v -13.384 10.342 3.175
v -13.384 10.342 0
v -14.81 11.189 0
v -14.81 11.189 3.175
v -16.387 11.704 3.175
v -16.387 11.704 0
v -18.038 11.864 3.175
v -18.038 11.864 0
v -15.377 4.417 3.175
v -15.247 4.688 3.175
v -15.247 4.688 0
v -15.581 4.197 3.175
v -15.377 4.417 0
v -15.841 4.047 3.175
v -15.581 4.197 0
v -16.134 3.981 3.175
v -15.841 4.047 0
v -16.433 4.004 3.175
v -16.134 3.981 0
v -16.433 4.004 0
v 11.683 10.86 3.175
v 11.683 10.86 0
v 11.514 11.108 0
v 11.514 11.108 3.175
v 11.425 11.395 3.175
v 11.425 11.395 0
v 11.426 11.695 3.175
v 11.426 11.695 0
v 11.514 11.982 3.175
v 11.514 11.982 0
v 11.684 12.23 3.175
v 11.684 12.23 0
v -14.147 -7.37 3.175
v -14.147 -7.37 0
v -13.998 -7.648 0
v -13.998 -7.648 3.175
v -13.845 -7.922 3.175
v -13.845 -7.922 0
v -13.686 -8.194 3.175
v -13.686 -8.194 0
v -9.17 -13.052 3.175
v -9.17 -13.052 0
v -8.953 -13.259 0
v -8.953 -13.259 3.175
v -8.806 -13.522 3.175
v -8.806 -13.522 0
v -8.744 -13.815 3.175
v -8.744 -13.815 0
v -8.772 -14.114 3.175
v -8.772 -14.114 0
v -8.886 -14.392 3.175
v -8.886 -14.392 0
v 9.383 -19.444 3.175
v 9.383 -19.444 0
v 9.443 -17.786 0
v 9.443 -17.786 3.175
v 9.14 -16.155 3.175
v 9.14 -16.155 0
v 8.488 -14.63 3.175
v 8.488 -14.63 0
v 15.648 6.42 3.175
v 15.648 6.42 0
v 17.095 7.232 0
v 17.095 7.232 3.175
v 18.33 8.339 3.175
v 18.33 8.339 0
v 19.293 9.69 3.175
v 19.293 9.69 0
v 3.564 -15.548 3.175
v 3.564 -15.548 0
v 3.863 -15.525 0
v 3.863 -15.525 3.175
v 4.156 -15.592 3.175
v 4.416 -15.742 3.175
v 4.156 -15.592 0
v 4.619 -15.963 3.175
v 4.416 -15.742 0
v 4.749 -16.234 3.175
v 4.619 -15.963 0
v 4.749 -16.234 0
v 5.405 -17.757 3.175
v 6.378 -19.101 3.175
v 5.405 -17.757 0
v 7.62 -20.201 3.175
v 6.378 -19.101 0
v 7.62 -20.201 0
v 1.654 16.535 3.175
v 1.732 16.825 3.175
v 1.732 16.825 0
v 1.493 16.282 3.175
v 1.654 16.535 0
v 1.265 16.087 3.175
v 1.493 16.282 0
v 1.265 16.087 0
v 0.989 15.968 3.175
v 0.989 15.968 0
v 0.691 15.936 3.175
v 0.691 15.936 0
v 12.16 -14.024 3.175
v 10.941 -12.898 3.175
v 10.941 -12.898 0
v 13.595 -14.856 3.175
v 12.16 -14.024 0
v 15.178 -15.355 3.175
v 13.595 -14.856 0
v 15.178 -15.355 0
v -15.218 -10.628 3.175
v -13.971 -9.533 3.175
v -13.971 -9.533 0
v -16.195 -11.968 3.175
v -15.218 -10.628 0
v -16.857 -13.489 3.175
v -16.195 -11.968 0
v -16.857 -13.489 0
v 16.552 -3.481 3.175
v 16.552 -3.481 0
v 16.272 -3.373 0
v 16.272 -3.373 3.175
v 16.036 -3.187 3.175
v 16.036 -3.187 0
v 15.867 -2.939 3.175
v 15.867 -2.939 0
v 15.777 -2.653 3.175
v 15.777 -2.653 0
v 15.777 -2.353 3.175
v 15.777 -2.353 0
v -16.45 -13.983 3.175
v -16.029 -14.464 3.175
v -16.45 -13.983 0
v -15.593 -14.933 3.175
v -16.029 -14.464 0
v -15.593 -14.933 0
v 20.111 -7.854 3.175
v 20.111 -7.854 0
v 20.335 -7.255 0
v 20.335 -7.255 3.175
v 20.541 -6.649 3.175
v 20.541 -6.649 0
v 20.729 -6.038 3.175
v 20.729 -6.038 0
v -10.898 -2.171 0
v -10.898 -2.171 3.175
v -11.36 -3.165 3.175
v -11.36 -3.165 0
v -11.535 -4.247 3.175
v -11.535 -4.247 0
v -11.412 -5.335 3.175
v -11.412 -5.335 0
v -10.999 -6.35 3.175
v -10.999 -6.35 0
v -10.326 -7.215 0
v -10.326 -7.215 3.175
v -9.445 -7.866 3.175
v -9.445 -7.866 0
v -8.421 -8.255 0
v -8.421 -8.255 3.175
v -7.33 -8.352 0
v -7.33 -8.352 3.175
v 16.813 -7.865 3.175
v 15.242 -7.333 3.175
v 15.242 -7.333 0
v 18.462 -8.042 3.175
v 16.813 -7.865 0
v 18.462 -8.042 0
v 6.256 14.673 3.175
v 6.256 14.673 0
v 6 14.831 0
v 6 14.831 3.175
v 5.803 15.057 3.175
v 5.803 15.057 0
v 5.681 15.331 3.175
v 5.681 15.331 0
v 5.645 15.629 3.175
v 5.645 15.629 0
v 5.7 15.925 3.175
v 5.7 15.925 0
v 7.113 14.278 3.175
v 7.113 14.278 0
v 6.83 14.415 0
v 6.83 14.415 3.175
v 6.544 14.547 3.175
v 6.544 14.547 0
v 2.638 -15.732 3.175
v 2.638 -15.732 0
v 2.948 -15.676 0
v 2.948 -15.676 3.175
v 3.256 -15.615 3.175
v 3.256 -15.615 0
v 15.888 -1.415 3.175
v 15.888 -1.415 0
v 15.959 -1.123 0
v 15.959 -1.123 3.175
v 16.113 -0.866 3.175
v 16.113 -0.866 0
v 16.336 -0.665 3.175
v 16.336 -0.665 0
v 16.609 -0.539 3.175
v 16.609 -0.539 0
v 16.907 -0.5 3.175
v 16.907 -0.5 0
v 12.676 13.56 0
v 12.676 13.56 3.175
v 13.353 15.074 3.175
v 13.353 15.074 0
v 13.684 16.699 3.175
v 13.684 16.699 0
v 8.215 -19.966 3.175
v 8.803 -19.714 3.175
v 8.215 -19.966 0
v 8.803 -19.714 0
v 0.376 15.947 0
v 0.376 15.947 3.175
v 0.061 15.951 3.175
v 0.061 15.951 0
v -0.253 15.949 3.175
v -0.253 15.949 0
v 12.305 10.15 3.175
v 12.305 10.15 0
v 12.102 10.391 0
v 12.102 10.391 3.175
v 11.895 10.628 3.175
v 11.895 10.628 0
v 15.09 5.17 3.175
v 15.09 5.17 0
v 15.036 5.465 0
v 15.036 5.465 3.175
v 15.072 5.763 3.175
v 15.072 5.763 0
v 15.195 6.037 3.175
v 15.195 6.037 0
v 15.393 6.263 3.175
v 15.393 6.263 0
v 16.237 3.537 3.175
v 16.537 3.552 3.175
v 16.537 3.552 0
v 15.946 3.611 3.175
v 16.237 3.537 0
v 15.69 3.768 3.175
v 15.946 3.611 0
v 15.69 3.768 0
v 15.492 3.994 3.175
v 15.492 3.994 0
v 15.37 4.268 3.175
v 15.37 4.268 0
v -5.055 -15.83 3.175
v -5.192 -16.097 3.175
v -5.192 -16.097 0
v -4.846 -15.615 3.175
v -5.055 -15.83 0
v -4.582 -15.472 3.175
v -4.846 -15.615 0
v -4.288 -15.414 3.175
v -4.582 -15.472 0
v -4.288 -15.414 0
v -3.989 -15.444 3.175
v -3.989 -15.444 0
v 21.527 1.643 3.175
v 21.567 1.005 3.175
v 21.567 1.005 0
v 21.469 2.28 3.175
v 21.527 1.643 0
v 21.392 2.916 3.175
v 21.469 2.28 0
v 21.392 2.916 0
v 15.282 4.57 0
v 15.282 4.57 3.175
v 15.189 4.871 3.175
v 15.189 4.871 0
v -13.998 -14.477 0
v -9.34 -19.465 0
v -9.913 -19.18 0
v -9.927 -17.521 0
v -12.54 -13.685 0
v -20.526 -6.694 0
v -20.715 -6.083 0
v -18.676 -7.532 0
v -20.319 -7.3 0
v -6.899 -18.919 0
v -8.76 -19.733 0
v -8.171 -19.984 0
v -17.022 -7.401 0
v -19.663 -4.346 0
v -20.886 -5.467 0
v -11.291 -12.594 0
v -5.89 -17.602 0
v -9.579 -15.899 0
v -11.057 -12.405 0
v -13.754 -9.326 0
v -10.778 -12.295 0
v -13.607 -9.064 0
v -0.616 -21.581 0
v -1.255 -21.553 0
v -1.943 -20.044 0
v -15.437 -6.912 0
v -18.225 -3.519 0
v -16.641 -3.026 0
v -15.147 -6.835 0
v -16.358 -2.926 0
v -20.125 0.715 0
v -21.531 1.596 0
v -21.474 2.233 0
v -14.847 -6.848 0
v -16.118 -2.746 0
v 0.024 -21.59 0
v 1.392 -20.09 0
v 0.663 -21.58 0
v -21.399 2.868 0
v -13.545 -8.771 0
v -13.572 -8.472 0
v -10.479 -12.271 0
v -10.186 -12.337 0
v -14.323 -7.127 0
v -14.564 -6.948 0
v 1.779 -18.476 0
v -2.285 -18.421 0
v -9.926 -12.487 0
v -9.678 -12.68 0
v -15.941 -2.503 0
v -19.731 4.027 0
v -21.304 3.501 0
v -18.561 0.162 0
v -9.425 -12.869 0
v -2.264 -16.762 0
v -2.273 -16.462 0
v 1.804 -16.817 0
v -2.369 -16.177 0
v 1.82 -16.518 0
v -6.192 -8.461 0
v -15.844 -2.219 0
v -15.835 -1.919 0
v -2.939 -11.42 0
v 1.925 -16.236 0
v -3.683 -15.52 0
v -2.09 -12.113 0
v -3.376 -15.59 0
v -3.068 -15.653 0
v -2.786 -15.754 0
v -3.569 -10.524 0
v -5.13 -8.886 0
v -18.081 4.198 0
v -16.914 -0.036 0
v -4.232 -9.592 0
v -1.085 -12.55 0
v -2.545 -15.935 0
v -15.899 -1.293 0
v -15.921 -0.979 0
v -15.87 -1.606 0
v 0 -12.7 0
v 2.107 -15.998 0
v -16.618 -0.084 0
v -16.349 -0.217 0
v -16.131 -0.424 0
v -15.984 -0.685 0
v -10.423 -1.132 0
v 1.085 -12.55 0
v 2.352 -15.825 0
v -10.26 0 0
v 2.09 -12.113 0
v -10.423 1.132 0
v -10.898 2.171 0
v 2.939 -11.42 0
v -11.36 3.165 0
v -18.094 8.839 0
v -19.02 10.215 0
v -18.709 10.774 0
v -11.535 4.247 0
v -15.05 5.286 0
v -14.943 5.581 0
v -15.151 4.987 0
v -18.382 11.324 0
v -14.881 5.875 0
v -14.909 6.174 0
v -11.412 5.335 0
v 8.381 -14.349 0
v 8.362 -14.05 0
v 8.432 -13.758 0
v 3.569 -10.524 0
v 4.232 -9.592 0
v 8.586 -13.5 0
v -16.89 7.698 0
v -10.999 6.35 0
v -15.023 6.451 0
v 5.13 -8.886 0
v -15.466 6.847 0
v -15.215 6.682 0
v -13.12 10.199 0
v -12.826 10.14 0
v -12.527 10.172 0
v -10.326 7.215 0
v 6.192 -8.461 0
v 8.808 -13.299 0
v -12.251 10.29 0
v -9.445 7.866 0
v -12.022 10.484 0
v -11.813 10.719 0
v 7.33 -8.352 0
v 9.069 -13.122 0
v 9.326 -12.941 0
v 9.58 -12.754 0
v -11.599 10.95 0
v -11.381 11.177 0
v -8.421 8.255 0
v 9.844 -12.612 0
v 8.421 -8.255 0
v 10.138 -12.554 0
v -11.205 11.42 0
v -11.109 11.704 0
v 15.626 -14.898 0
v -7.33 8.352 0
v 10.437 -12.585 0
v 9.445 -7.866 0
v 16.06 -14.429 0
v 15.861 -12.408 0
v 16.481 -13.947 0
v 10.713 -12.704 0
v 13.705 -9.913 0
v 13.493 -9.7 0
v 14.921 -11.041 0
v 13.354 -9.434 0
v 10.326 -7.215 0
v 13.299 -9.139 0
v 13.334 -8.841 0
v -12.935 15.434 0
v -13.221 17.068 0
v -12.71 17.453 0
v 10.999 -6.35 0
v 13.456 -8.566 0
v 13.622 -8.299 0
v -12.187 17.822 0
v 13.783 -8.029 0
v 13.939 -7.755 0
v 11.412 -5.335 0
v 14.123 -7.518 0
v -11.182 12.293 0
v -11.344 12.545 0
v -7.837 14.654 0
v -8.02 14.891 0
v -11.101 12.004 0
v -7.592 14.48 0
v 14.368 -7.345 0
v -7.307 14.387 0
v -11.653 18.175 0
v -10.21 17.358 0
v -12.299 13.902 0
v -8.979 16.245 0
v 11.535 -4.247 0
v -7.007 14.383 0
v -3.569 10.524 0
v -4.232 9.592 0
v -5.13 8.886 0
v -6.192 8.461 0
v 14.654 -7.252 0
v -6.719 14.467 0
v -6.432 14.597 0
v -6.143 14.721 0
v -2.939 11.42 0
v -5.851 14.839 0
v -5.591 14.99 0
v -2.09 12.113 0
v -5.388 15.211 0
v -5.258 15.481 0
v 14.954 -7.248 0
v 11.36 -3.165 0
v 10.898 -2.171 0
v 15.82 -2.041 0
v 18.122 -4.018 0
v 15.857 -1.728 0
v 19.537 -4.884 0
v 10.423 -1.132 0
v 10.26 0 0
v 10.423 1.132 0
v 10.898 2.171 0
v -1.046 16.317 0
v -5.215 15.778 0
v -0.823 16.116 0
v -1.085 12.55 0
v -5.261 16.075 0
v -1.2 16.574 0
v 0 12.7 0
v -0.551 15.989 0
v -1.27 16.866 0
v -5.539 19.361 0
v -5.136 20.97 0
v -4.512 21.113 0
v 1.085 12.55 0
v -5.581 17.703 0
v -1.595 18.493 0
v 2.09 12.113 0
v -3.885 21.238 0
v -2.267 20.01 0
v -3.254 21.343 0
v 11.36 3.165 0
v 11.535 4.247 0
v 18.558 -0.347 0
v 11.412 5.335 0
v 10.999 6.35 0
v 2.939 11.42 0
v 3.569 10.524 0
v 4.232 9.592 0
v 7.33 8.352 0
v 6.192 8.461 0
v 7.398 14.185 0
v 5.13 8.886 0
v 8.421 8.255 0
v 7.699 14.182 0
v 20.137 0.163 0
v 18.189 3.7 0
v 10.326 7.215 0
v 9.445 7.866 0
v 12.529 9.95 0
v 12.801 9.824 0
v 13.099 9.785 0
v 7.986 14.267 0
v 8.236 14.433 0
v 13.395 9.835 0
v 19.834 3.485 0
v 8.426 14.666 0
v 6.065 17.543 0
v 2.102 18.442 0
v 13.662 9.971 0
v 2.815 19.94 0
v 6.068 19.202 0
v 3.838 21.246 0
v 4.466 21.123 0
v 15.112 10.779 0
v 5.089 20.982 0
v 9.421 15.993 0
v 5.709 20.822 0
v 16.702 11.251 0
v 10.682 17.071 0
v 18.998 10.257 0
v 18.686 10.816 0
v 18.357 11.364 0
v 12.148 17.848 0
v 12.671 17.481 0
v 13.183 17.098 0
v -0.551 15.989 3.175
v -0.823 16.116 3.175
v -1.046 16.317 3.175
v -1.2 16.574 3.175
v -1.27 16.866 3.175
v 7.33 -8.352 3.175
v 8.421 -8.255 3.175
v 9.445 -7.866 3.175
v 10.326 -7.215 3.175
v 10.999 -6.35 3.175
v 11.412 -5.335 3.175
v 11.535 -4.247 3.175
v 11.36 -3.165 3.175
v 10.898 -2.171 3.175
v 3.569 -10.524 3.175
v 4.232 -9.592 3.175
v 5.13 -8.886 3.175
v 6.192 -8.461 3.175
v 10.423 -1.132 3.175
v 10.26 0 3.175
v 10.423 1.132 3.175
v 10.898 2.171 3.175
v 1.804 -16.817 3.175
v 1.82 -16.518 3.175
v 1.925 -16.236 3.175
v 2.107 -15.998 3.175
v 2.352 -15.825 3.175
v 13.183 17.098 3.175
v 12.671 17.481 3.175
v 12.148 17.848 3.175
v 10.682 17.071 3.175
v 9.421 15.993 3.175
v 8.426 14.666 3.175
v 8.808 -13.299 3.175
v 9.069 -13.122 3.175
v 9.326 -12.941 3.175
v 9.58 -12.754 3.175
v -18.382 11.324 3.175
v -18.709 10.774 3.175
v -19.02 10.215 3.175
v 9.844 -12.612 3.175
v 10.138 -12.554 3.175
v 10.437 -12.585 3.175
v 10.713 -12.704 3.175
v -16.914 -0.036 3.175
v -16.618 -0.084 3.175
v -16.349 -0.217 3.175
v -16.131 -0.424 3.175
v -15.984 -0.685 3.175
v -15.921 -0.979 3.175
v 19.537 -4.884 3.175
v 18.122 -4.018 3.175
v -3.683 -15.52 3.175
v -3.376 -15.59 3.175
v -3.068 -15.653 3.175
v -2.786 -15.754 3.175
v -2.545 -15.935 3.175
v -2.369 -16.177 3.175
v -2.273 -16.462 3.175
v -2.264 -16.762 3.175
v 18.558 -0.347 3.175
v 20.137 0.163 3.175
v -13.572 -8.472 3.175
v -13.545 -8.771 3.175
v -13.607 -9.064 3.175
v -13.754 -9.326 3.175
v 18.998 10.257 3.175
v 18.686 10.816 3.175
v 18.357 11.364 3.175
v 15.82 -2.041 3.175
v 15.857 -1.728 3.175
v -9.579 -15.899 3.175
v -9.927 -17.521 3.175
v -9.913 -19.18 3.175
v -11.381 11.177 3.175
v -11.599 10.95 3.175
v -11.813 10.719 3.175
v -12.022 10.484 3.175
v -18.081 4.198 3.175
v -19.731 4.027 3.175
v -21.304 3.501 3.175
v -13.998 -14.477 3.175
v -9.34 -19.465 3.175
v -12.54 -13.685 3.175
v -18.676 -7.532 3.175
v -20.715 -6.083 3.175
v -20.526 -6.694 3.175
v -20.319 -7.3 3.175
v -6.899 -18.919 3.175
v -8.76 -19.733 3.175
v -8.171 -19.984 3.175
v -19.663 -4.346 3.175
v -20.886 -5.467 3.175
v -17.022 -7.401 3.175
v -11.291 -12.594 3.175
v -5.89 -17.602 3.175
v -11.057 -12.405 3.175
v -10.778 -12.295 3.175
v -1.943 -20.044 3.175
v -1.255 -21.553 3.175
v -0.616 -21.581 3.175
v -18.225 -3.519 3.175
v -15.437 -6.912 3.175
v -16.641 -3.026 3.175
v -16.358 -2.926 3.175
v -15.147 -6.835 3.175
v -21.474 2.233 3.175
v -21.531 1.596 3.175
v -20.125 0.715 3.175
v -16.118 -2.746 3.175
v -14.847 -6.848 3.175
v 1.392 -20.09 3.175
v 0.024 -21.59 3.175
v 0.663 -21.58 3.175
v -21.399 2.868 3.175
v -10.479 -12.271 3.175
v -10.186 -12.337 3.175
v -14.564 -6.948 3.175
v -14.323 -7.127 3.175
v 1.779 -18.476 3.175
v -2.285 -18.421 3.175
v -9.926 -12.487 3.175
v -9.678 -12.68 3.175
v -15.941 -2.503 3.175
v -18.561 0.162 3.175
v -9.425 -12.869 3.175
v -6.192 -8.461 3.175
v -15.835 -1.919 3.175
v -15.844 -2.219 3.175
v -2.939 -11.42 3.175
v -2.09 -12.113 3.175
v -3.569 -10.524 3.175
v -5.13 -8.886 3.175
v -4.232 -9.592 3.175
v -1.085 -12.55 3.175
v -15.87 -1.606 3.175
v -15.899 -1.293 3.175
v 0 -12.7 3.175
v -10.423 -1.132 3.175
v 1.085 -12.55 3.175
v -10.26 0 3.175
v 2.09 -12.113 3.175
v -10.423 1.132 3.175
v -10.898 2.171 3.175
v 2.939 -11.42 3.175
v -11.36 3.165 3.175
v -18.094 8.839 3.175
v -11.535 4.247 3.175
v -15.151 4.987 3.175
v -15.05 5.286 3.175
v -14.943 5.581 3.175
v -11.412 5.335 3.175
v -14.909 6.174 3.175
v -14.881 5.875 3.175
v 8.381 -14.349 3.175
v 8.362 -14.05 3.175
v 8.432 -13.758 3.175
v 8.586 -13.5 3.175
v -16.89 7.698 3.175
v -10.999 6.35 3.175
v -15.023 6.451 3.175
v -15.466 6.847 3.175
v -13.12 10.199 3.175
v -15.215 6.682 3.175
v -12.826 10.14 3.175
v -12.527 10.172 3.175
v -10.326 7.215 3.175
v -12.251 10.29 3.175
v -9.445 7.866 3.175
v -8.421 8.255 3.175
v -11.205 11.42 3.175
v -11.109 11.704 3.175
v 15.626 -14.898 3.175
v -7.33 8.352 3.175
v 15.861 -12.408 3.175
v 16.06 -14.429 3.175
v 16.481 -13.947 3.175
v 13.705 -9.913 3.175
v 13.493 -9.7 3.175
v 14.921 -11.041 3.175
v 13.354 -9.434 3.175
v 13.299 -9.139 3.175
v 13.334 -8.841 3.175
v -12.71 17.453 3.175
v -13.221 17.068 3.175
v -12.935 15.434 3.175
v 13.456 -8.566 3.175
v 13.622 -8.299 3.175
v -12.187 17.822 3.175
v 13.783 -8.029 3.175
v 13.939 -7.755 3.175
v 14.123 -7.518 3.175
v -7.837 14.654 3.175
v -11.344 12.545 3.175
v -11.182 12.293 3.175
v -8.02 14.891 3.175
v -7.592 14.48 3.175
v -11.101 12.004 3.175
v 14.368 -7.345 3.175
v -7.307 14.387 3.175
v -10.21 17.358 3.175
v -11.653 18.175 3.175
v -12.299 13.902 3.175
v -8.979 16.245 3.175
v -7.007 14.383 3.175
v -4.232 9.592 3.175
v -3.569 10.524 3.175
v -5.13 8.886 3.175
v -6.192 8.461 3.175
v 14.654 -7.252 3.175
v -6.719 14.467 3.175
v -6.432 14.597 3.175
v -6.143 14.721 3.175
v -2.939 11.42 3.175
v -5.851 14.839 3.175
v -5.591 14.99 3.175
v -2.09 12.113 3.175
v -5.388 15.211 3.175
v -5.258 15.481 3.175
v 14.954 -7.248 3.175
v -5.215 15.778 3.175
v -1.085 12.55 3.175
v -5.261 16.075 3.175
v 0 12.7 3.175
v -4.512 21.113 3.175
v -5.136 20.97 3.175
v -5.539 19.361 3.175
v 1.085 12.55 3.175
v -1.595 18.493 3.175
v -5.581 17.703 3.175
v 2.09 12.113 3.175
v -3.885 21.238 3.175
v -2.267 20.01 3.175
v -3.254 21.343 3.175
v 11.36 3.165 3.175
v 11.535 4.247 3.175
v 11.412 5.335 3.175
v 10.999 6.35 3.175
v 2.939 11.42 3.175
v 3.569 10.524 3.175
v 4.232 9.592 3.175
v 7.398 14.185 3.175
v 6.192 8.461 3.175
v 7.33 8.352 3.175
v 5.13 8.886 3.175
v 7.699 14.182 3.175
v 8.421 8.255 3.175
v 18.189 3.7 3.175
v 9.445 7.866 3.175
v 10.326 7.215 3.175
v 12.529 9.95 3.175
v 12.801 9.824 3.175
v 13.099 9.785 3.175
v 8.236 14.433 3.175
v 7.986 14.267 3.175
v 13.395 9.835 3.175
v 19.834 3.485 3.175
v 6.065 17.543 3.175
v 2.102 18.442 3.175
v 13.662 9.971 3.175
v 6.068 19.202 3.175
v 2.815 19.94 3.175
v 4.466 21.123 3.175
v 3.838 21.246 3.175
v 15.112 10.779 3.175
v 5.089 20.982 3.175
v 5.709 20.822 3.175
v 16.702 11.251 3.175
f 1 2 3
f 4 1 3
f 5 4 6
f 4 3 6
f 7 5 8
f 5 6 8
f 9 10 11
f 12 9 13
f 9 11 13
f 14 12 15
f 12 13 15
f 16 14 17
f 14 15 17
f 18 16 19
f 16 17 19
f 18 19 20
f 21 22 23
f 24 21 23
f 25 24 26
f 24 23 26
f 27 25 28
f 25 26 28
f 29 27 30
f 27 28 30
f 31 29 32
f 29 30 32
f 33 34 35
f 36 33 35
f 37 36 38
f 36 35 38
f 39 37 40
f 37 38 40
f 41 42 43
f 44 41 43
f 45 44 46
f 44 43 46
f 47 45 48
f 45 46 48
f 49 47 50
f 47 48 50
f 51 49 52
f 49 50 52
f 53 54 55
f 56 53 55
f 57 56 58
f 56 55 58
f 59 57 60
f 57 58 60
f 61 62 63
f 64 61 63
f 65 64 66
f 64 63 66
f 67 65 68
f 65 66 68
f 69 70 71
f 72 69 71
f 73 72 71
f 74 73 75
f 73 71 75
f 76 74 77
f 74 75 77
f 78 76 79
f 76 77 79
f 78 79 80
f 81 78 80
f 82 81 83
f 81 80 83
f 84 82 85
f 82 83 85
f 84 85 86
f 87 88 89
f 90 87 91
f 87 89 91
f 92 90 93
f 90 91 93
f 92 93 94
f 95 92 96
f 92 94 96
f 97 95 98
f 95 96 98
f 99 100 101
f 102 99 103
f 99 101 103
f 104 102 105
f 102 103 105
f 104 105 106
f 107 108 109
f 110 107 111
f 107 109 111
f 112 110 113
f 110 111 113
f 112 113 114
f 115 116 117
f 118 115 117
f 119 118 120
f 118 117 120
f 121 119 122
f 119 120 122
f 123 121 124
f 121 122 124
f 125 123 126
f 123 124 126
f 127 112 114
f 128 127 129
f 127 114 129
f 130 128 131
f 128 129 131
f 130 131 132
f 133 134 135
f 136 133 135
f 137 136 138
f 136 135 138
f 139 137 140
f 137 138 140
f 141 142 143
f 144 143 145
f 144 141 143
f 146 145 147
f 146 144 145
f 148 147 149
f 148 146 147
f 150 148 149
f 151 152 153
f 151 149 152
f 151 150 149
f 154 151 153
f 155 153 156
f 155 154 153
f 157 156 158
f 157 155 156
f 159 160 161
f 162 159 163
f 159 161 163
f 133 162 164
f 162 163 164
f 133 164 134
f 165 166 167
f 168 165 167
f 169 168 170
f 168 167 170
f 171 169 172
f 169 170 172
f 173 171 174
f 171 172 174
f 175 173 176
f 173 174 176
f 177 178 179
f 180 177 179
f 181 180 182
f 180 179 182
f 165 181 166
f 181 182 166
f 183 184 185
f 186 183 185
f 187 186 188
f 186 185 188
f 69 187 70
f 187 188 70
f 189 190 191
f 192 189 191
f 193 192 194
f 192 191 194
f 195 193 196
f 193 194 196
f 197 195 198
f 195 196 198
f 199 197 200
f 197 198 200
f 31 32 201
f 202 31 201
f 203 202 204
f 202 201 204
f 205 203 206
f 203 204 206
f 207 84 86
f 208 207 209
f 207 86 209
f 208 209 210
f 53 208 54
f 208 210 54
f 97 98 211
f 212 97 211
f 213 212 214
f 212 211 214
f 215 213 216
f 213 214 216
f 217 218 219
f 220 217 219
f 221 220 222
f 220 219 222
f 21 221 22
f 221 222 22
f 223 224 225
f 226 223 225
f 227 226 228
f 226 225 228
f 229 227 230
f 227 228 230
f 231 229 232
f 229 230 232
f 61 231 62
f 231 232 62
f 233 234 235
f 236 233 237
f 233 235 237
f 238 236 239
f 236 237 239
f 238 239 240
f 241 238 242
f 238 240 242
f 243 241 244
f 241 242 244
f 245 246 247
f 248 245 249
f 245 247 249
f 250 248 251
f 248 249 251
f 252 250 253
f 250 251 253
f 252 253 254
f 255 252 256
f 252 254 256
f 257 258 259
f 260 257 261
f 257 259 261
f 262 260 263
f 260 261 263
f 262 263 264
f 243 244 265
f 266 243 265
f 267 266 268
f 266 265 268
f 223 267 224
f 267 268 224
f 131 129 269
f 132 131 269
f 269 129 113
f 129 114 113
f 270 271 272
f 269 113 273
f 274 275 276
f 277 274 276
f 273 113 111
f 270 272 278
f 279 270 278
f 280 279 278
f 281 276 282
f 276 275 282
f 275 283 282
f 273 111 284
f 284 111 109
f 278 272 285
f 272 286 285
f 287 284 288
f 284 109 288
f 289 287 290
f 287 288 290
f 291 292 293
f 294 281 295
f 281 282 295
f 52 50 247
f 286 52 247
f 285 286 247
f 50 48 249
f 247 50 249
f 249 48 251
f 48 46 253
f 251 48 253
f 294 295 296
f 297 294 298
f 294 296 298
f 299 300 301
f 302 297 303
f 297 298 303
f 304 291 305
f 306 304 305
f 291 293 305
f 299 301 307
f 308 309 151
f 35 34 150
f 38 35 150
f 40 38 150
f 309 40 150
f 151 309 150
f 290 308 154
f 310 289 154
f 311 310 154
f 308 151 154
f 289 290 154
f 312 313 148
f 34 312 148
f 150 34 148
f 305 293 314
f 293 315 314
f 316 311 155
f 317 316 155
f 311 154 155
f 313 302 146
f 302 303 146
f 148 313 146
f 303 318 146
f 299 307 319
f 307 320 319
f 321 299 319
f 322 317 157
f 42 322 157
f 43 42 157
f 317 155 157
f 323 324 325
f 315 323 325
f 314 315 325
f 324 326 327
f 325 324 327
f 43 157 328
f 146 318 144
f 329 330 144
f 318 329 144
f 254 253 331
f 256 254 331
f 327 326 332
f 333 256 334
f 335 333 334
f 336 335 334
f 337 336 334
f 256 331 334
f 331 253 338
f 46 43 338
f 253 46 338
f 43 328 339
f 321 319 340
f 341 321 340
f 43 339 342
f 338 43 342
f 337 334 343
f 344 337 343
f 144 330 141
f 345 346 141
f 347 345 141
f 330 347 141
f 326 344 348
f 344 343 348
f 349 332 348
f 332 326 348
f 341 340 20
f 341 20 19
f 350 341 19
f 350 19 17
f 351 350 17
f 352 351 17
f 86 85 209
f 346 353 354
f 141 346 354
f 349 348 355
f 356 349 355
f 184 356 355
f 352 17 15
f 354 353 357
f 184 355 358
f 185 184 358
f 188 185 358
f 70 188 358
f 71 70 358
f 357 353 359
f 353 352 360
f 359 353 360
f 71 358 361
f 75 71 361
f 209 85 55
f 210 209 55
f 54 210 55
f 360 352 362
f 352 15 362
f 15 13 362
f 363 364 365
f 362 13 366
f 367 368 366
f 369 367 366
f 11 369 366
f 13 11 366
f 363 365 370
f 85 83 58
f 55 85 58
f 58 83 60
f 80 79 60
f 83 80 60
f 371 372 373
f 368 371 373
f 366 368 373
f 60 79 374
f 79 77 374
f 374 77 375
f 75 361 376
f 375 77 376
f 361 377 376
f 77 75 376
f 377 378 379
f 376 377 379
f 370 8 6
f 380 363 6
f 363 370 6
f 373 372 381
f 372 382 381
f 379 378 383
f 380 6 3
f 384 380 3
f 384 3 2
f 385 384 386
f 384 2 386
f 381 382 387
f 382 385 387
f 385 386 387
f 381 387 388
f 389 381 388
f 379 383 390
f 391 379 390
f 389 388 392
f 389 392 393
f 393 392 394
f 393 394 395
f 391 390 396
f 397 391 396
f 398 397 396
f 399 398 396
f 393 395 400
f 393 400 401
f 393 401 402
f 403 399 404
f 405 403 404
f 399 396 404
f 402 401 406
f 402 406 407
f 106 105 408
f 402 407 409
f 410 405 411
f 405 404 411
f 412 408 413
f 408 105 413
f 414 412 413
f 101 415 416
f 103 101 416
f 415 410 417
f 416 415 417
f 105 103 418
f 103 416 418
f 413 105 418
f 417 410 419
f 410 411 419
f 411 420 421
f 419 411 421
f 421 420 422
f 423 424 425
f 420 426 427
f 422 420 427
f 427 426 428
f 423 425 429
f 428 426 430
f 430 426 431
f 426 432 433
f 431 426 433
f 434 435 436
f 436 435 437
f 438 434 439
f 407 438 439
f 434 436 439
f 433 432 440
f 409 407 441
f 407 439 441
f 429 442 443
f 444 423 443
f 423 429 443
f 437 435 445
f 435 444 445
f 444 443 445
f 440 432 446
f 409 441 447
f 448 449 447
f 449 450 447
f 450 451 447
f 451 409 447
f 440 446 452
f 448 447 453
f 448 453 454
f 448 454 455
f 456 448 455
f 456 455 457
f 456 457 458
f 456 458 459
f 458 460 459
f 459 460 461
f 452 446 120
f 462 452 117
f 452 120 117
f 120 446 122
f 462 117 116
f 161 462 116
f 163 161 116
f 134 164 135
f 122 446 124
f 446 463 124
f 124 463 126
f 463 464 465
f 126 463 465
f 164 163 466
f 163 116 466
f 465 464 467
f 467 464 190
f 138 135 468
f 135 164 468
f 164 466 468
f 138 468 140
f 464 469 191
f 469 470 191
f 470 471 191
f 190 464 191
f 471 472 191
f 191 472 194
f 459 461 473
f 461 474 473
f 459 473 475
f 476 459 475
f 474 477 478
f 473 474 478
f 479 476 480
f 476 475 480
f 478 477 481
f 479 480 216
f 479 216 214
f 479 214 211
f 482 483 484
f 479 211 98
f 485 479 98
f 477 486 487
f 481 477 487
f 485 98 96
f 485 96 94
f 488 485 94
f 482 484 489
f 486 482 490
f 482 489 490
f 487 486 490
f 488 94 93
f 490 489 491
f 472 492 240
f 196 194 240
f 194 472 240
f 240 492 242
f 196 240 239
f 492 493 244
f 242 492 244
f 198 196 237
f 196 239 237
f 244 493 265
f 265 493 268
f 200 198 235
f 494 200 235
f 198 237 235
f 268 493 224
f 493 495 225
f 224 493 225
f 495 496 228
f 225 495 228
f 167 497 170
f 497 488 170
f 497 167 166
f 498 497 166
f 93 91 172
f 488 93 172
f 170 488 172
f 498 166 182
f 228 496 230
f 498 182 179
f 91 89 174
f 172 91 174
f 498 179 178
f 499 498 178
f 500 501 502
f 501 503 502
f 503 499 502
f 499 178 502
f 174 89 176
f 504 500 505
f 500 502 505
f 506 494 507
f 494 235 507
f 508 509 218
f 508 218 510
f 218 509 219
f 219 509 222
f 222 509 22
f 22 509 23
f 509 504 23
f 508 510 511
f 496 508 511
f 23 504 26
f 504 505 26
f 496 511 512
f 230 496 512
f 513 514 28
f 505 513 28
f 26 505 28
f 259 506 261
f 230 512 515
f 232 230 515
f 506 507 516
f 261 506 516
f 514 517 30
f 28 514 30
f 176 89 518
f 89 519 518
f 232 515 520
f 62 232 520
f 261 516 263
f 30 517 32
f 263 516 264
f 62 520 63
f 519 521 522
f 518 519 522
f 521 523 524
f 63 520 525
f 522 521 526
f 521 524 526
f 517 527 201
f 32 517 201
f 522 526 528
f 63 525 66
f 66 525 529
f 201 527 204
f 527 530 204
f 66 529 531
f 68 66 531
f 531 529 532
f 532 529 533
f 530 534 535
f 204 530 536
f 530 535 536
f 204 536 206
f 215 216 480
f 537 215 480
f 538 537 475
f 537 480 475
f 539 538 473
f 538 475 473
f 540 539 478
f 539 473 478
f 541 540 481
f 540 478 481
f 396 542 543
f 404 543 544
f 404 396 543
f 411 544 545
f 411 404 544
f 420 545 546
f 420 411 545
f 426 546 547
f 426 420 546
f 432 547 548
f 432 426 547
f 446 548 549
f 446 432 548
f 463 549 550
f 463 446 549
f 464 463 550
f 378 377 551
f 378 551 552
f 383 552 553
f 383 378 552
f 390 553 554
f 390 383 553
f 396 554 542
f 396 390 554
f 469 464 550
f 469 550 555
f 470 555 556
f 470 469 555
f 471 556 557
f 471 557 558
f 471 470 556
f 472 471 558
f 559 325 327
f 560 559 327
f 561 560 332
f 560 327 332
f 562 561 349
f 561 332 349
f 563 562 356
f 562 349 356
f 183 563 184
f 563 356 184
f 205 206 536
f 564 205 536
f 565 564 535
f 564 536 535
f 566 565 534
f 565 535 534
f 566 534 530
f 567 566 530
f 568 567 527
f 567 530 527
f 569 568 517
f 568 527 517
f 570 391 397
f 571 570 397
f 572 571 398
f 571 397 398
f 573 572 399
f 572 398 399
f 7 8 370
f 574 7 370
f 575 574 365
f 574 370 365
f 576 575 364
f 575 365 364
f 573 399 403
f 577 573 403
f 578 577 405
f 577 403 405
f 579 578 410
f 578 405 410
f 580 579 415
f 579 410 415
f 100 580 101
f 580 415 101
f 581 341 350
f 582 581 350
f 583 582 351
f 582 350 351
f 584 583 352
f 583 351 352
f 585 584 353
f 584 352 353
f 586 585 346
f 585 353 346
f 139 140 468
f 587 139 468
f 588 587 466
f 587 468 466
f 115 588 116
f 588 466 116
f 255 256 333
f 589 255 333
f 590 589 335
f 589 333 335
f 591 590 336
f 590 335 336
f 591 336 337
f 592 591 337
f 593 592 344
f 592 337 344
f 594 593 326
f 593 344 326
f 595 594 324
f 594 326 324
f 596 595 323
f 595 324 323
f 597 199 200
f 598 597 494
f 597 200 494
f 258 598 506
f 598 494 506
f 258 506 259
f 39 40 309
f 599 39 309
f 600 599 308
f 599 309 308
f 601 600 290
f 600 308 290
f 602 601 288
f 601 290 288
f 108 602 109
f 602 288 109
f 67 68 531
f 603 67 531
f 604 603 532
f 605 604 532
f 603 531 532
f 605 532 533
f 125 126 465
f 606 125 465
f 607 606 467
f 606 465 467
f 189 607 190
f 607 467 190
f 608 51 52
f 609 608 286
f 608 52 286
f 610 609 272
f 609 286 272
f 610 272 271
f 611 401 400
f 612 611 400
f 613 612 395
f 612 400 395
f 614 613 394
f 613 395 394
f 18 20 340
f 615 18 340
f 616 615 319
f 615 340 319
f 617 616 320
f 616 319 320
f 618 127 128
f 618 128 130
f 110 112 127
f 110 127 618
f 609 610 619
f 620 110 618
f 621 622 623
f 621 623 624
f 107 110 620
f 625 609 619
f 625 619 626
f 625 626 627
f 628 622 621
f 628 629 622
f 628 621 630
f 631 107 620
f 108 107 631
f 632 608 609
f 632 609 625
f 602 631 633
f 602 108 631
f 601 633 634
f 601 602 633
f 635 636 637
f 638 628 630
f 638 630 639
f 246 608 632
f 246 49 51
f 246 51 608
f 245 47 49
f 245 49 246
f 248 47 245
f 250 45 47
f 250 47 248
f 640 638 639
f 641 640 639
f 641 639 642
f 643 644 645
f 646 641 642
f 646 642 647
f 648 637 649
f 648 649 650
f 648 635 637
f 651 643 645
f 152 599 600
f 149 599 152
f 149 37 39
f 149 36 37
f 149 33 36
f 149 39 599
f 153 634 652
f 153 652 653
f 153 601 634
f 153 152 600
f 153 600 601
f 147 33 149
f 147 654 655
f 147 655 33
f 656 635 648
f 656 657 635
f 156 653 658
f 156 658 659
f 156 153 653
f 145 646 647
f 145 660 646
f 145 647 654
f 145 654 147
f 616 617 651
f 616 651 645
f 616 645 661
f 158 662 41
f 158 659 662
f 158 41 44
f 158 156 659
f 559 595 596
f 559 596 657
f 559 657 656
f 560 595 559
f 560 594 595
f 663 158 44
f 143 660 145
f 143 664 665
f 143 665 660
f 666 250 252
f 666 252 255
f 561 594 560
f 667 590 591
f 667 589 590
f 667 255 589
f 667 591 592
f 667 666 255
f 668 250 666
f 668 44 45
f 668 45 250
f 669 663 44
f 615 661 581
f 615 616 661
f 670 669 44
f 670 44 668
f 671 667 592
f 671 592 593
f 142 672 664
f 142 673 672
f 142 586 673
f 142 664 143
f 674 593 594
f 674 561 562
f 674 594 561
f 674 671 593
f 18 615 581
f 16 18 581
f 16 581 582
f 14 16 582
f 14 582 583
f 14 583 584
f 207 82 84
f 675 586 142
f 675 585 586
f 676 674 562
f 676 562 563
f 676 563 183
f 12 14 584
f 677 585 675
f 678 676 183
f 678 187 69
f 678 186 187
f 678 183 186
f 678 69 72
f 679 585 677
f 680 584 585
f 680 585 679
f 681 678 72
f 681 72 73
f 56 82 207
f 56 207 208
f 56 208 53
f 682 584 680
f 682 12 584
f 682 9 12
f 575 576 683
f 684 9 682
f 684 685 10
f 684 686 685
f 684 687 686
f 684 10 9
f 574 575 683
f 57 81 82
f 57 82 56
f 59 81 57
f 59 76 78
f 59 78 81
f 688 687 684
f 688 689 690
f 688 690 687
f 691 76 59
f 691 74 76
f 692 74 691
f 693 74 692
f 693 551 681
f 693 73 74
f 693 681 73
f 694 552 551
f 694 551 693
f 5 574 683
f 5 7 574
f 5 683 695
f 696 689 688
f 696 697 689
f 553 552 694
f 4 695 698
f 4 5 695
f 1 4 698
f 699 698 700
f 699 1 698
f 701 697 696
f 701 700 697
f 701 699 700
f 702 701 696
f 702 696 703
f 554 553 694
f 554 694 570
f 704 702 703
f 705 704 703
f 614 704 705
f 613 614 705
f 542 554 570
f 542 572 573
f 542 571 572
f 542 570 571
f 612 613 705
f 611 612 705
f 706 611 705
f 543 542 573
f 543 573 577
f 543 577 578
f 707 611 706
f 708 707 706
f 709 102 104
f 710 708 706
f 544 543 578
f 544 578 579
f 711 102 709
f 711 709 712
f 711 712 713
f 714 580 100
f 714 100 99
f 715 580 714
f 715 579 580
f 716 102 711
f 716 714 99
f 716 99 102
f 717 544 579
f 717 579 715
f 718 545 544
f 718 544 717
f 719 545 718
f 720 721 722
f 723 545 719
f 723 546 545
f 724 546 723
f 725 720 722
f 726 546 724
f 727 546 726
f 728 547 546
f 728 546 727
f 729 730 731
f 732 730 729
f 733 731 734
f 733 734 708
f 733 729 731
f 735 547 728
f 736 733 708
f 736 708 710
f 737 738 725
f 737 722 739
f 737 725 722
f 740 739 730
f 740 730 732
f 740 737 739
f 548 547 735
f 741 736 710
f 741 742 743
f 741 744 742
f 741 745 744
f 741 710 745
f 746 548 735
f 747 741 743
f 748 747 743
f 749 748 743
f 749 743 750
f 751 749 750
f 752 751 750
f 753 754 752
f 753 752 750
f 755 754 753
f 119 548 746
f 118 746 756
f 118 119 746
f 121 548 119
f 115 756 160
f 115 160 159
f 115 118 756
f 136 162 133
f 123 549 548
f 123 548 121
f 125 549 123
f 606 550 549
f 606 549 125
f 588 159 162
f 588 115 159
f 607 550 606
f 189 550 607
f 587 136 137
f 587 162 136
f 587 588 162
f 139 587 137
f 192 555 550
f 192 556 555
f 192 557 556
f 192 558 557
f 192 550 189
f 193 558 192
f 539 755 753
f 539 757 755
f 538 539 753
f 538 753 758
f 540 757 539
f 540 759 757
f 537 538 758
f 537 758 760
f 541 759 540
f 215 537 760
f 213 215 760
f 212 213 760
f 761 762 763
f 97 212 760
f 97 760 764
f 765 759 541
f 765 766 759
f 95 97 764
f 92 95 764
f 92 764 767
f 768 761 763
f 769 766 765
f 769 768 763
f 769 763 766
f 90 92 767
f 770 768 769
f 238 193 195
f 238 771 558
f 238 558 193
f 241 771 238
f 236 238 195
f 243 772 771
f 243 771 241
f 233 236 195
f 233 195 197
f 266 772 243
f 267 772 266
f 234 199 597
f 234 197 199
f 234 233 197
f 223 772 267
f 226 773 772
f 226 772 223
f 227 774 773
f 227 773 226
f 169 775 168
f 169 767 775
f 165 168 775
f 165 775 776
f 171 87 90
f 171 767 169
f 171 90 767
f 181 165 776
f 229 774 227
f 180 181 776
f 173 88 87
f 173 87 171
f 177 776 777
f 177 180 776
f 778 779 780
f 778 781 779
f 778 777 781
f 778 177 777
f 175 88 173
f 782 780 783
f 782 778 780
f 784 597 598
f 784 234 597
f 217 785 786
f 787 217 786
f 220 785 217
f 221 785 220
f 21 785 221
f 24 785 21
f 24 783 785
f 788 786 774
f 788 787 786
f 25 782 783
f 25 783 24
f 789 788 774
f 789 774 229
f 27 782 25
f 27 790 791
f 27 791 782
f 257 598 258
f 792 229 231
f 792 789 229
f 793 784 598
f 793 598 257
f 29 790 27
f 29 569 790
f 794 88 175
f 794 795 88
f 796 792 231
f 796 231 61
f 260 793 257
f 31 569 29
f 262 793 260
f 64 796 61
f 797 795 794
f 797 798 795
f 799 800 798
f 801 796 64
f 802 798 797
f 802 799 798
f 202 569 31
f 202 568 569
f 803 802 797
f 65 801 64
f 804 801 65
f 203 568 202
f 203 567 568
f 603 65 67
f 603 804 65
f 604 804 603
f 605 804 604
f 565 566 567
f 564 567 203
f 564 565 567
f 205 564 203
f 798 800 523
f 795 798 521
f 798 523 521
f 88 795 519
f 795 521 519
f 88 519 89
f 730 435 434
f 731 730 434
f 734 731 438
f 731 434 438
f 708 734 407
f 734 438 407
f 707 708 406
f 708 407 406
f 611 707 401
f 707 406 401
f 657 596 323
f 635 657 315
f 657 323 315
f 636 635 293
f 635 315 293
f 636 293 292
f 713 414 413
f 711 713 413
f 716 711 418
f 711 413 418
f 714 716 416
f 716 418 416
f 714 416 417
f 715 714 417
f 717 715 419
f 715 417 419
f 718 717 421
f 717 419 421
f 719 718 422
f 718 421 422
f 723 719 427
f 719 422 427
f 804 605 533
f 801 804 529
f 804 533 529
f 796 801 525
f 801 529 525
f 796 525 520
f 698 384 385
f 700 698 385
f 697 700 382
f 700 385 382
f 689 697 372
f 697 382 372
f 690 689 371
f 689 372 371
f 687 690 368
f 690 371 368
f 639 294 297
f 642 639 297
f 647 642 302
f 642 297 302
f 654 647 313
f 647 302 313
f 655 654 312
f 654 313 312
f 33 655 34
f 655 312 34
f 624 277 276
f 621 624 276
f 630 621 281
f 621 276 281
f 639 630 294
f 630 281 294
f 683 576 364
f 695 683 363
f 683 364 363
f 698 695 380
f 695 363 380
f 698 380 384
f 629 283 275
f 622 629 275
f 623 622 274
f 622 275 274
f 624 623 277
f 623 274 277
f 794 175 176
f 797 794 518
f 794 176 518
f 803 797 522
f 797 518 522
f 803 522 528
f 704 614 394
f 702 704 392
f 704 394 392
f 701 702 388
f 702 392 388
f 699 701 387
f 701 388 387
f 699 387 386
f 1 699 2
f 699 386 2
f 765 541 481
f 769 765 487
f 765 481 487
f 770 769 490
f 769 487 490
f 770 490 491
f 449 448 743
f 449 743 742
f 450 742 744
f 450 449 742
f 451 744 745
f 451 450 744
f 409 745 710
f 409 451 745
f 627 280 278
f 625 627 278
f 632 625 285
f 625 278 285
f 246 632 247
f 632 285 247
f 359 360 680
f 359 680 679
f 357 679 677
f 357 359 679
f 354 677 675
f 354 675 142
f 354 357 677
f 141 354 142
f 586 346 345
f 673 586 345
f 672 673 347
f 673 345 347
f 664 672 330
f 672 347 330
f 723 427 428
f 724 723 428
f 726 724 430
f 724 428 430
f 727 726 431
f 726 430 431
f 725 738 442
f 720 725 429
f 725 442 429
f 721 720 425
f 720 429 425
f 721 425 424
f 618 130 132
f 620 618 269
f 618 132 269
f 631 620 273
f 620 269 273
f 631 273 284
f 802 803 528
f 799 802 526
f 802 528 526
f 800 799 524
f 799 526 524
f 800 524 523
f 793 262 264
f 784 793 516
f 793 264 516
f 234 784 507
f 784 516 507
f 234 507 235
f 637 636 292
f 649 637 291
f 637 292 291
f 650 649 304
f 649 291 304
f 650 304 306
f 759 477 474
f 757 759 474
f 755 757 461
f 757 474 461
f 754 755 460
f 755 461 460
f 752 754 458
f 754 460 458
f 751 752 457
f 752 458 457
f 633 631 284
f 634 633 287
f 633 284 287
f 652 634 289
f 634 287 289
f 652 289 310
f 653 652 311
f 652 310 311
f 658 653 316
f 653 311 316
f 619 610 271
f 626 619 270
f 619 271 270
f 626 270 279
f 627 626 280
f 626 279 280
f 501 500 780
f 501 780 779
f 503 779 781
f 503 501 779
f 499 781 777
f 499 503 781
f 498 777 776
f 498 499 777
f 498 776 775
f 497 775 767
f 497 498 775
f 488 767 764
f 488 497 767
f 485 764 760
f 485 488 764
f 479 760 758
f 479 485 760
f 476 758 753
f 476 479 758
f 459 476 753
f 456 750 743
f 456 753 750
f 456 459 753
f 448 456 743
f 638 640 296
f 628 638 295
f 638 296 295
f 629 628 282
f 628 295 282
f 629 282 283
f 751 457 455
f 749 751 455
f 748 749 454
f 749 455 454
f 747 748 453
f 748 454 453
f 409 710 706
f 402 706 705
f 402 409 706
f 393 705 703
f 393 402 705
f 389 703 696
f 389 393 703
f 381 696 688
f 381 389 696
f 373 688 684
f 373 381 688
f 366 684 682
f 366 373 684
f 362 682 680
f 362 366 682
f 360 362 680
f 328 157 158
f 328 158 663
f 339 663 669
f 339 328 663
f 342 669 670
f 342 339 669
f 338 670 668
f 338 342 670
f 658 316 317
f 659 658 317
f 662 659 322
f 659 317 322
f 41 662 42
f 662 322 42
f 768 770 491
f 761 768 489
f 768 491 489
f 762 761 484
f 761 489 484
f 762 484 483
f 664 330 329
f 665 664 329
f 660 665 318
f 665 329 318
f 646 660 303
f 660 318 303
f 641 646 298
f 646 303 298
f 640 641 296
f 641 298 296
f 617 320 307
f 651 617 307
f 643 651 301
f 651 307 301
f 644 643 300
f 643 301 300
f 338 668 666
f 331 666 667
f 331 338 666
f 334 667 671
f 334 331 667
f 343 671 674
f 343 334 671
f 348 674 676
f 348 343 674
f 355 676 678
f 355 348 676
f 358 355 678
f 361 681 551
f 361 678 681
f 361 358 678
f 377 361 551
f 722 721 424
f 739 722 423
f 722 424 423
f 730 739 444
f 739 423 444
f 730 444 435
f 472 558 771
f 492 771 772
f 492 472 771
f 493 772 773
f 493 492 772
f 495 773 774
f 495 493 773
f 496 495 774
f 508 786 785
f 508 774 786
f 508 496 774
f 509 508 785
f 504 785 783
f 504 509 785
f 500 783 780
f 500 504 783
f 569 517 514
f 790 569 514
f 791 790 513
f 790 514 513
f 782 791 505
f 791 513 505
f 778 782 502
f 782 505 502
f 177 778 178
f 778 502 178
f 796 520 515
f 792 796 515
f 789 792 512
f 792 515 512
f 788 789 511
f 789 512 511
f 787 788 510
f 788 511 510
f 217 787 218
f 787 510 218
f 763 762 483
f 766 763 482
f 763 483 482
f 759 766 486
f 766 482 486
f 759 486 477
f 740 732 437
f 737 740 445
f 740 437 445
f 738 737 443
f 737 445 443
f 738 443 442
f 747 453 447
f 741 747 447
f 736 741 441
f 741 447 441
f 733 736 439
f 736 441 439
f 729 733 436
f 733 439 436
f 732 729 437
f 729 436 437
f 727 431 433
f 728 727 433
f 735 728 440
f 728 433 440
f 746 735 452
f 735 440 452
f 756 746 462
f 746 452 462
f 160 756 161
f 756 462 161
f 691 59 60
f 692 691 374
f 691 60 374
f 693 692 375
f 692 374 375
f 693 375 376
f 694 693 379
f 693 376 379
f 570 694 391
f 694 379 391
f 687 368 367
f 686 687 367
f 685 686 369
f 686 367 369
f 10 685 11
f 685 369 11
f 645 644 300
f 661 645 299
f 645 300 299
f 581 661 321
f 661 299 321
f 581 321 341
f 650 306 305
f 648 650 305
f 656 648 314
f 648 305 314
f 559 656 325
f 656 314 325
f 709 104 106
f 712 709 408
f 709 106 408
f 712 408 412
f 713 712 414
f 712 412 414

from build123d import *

# Parameters (mm, degrees)
SKETCH3_R          = 21.59
GEARBODY_DEPTH     = 3.175
TOOTHCUT_DEPTH     = 31.697505192
CIRPATTERN1_COUNT  = 15
BOREDIA_R          = 1.499997014
BORE_DEPTH         = 12700
CUT_EXTRUDE1_DEPTH = 31.681055895


with BuildPart() as part:
    # Sketch3 → gearBody (new body)
    with BuildSketch(Plane.XY):
        Circle(SKETCH3_R)
    extrude(amount=GEARBODY_DEPTH)

    # Sketch2 → toothCut (cut, through all)
    with BuildSketch(Plane.XY):
        with BuildLine():
            ThreePointArc((15.776737466, -2.352729556), (15.839461945, -1.88473519), (15.888307135, -1.41508933))
            ThreePointArc((15.888307135, -1.41508933), (16.217352653, -0.757105225), (16.906558448, -0.499793338))
            ThreePointArc((16.906558448, -0.499793338), (20.511887209, 0.343917978), (23.283949955, 2.798691365))
            ThreePointArc((23.283949955, 2.798691365), (23.287267838, -2.770948491), (21.977086037, -8.184295218))
            ThreePointArc((21.977086037, -8.184295218), (19.858454824, -5.147578893), (16.551776463, -3.481408892))
            ThreePointArc((16.551776463, -3.481408892), (15.942194667, -3.069554465), (15.776737466, -2.352729556))
        make_face()
    toothcut = extrude(amount=TOOTHCUT_DEPTH, mode=Mode.SUBTRACT)

    # CirPattern1: toothCut ×15 about axis
    cirpattern1_axis = Axis((0, 0, 3.175), (0, 0, -1))
    for i in range(1, CIRPATTERN1_COUNT):
        add(toothcut.rotate(cirpattern1_axis, i * 360 / CIRPATTERN1_COUNT), mode=Mode.SUBTRACT)

    # boreDia → bore (cut, symmetric)
    with BuildSketch(Plane.XY):
        Circle(BOREDIA_R)
    extrude(amount=BORE_DEPTH, both=True, mode=Mode.SUBTRACT)

    # Sketch4 → Cut-Extrude1 (cut, through all)
    with BuildSketch(Plane(origin=(0, 0, 0), x_dir=(-1, 0, 0), z_dir=(0, 0, -1))):
        with BuildLine():
            ThreePointArc((-7.329682086, 8.352449747), (-5.130117272, 8.885623765), (-3.568592622, 10.523915761))
            ThreePointArc((-3.568592622, 10.523915761), (0, 12.7), (3.568592622, 10.523915761))
            ThreePointArc((3.568592622, 10.523915761), (5.130117272, 8.885623765), (7.329682086, 8.352449747))
            ThreePointArc((7.329682086, 8.352449747), (10.998522628, 6.35), (10.898274707, 2.171466014))
            ThreePointArc((10.898274707, 2.171466014), (10.260234545, 0), (10.898274707, -2.171466014))
            ThreePointArc((10.898274707, -2.171466014), (10.998522628, -6.35), (7.329682086, -8.352449747))
            ThreePointArc((7.329682086, -8.352449747), (5.130117272, -8.885623765), (3.568592622, -10.523915761))
            ThreePointArc((3.568592622, -10.523915761), (0, -12.7), (-3.568592622, -10.523915761))
            ThreePointArc((-3.568592622, -10.523915761), (-5.130117272, -8.885623765), (-7.329682086, -8.352449747))
            ThreePointArc((-7.329682086, -8.352449747), (-10.998522628, -6.35), (-10.898274707, -2.171466014))
            ThreePointArc((-10.898274707, -2.171466014), (-10.260234545, 0), (-10.898274707, 2.171466014))
            ThreePointArc((-10.898274707, 2.171466014), (-10.998522628, 6.35), (-7.329682086, 8.352449747))
        make_face()
    extrude(amount=-CUT_EXTRUDE1_DEPTH, mode=Mode.SUBTRACT)


solid = part.part
